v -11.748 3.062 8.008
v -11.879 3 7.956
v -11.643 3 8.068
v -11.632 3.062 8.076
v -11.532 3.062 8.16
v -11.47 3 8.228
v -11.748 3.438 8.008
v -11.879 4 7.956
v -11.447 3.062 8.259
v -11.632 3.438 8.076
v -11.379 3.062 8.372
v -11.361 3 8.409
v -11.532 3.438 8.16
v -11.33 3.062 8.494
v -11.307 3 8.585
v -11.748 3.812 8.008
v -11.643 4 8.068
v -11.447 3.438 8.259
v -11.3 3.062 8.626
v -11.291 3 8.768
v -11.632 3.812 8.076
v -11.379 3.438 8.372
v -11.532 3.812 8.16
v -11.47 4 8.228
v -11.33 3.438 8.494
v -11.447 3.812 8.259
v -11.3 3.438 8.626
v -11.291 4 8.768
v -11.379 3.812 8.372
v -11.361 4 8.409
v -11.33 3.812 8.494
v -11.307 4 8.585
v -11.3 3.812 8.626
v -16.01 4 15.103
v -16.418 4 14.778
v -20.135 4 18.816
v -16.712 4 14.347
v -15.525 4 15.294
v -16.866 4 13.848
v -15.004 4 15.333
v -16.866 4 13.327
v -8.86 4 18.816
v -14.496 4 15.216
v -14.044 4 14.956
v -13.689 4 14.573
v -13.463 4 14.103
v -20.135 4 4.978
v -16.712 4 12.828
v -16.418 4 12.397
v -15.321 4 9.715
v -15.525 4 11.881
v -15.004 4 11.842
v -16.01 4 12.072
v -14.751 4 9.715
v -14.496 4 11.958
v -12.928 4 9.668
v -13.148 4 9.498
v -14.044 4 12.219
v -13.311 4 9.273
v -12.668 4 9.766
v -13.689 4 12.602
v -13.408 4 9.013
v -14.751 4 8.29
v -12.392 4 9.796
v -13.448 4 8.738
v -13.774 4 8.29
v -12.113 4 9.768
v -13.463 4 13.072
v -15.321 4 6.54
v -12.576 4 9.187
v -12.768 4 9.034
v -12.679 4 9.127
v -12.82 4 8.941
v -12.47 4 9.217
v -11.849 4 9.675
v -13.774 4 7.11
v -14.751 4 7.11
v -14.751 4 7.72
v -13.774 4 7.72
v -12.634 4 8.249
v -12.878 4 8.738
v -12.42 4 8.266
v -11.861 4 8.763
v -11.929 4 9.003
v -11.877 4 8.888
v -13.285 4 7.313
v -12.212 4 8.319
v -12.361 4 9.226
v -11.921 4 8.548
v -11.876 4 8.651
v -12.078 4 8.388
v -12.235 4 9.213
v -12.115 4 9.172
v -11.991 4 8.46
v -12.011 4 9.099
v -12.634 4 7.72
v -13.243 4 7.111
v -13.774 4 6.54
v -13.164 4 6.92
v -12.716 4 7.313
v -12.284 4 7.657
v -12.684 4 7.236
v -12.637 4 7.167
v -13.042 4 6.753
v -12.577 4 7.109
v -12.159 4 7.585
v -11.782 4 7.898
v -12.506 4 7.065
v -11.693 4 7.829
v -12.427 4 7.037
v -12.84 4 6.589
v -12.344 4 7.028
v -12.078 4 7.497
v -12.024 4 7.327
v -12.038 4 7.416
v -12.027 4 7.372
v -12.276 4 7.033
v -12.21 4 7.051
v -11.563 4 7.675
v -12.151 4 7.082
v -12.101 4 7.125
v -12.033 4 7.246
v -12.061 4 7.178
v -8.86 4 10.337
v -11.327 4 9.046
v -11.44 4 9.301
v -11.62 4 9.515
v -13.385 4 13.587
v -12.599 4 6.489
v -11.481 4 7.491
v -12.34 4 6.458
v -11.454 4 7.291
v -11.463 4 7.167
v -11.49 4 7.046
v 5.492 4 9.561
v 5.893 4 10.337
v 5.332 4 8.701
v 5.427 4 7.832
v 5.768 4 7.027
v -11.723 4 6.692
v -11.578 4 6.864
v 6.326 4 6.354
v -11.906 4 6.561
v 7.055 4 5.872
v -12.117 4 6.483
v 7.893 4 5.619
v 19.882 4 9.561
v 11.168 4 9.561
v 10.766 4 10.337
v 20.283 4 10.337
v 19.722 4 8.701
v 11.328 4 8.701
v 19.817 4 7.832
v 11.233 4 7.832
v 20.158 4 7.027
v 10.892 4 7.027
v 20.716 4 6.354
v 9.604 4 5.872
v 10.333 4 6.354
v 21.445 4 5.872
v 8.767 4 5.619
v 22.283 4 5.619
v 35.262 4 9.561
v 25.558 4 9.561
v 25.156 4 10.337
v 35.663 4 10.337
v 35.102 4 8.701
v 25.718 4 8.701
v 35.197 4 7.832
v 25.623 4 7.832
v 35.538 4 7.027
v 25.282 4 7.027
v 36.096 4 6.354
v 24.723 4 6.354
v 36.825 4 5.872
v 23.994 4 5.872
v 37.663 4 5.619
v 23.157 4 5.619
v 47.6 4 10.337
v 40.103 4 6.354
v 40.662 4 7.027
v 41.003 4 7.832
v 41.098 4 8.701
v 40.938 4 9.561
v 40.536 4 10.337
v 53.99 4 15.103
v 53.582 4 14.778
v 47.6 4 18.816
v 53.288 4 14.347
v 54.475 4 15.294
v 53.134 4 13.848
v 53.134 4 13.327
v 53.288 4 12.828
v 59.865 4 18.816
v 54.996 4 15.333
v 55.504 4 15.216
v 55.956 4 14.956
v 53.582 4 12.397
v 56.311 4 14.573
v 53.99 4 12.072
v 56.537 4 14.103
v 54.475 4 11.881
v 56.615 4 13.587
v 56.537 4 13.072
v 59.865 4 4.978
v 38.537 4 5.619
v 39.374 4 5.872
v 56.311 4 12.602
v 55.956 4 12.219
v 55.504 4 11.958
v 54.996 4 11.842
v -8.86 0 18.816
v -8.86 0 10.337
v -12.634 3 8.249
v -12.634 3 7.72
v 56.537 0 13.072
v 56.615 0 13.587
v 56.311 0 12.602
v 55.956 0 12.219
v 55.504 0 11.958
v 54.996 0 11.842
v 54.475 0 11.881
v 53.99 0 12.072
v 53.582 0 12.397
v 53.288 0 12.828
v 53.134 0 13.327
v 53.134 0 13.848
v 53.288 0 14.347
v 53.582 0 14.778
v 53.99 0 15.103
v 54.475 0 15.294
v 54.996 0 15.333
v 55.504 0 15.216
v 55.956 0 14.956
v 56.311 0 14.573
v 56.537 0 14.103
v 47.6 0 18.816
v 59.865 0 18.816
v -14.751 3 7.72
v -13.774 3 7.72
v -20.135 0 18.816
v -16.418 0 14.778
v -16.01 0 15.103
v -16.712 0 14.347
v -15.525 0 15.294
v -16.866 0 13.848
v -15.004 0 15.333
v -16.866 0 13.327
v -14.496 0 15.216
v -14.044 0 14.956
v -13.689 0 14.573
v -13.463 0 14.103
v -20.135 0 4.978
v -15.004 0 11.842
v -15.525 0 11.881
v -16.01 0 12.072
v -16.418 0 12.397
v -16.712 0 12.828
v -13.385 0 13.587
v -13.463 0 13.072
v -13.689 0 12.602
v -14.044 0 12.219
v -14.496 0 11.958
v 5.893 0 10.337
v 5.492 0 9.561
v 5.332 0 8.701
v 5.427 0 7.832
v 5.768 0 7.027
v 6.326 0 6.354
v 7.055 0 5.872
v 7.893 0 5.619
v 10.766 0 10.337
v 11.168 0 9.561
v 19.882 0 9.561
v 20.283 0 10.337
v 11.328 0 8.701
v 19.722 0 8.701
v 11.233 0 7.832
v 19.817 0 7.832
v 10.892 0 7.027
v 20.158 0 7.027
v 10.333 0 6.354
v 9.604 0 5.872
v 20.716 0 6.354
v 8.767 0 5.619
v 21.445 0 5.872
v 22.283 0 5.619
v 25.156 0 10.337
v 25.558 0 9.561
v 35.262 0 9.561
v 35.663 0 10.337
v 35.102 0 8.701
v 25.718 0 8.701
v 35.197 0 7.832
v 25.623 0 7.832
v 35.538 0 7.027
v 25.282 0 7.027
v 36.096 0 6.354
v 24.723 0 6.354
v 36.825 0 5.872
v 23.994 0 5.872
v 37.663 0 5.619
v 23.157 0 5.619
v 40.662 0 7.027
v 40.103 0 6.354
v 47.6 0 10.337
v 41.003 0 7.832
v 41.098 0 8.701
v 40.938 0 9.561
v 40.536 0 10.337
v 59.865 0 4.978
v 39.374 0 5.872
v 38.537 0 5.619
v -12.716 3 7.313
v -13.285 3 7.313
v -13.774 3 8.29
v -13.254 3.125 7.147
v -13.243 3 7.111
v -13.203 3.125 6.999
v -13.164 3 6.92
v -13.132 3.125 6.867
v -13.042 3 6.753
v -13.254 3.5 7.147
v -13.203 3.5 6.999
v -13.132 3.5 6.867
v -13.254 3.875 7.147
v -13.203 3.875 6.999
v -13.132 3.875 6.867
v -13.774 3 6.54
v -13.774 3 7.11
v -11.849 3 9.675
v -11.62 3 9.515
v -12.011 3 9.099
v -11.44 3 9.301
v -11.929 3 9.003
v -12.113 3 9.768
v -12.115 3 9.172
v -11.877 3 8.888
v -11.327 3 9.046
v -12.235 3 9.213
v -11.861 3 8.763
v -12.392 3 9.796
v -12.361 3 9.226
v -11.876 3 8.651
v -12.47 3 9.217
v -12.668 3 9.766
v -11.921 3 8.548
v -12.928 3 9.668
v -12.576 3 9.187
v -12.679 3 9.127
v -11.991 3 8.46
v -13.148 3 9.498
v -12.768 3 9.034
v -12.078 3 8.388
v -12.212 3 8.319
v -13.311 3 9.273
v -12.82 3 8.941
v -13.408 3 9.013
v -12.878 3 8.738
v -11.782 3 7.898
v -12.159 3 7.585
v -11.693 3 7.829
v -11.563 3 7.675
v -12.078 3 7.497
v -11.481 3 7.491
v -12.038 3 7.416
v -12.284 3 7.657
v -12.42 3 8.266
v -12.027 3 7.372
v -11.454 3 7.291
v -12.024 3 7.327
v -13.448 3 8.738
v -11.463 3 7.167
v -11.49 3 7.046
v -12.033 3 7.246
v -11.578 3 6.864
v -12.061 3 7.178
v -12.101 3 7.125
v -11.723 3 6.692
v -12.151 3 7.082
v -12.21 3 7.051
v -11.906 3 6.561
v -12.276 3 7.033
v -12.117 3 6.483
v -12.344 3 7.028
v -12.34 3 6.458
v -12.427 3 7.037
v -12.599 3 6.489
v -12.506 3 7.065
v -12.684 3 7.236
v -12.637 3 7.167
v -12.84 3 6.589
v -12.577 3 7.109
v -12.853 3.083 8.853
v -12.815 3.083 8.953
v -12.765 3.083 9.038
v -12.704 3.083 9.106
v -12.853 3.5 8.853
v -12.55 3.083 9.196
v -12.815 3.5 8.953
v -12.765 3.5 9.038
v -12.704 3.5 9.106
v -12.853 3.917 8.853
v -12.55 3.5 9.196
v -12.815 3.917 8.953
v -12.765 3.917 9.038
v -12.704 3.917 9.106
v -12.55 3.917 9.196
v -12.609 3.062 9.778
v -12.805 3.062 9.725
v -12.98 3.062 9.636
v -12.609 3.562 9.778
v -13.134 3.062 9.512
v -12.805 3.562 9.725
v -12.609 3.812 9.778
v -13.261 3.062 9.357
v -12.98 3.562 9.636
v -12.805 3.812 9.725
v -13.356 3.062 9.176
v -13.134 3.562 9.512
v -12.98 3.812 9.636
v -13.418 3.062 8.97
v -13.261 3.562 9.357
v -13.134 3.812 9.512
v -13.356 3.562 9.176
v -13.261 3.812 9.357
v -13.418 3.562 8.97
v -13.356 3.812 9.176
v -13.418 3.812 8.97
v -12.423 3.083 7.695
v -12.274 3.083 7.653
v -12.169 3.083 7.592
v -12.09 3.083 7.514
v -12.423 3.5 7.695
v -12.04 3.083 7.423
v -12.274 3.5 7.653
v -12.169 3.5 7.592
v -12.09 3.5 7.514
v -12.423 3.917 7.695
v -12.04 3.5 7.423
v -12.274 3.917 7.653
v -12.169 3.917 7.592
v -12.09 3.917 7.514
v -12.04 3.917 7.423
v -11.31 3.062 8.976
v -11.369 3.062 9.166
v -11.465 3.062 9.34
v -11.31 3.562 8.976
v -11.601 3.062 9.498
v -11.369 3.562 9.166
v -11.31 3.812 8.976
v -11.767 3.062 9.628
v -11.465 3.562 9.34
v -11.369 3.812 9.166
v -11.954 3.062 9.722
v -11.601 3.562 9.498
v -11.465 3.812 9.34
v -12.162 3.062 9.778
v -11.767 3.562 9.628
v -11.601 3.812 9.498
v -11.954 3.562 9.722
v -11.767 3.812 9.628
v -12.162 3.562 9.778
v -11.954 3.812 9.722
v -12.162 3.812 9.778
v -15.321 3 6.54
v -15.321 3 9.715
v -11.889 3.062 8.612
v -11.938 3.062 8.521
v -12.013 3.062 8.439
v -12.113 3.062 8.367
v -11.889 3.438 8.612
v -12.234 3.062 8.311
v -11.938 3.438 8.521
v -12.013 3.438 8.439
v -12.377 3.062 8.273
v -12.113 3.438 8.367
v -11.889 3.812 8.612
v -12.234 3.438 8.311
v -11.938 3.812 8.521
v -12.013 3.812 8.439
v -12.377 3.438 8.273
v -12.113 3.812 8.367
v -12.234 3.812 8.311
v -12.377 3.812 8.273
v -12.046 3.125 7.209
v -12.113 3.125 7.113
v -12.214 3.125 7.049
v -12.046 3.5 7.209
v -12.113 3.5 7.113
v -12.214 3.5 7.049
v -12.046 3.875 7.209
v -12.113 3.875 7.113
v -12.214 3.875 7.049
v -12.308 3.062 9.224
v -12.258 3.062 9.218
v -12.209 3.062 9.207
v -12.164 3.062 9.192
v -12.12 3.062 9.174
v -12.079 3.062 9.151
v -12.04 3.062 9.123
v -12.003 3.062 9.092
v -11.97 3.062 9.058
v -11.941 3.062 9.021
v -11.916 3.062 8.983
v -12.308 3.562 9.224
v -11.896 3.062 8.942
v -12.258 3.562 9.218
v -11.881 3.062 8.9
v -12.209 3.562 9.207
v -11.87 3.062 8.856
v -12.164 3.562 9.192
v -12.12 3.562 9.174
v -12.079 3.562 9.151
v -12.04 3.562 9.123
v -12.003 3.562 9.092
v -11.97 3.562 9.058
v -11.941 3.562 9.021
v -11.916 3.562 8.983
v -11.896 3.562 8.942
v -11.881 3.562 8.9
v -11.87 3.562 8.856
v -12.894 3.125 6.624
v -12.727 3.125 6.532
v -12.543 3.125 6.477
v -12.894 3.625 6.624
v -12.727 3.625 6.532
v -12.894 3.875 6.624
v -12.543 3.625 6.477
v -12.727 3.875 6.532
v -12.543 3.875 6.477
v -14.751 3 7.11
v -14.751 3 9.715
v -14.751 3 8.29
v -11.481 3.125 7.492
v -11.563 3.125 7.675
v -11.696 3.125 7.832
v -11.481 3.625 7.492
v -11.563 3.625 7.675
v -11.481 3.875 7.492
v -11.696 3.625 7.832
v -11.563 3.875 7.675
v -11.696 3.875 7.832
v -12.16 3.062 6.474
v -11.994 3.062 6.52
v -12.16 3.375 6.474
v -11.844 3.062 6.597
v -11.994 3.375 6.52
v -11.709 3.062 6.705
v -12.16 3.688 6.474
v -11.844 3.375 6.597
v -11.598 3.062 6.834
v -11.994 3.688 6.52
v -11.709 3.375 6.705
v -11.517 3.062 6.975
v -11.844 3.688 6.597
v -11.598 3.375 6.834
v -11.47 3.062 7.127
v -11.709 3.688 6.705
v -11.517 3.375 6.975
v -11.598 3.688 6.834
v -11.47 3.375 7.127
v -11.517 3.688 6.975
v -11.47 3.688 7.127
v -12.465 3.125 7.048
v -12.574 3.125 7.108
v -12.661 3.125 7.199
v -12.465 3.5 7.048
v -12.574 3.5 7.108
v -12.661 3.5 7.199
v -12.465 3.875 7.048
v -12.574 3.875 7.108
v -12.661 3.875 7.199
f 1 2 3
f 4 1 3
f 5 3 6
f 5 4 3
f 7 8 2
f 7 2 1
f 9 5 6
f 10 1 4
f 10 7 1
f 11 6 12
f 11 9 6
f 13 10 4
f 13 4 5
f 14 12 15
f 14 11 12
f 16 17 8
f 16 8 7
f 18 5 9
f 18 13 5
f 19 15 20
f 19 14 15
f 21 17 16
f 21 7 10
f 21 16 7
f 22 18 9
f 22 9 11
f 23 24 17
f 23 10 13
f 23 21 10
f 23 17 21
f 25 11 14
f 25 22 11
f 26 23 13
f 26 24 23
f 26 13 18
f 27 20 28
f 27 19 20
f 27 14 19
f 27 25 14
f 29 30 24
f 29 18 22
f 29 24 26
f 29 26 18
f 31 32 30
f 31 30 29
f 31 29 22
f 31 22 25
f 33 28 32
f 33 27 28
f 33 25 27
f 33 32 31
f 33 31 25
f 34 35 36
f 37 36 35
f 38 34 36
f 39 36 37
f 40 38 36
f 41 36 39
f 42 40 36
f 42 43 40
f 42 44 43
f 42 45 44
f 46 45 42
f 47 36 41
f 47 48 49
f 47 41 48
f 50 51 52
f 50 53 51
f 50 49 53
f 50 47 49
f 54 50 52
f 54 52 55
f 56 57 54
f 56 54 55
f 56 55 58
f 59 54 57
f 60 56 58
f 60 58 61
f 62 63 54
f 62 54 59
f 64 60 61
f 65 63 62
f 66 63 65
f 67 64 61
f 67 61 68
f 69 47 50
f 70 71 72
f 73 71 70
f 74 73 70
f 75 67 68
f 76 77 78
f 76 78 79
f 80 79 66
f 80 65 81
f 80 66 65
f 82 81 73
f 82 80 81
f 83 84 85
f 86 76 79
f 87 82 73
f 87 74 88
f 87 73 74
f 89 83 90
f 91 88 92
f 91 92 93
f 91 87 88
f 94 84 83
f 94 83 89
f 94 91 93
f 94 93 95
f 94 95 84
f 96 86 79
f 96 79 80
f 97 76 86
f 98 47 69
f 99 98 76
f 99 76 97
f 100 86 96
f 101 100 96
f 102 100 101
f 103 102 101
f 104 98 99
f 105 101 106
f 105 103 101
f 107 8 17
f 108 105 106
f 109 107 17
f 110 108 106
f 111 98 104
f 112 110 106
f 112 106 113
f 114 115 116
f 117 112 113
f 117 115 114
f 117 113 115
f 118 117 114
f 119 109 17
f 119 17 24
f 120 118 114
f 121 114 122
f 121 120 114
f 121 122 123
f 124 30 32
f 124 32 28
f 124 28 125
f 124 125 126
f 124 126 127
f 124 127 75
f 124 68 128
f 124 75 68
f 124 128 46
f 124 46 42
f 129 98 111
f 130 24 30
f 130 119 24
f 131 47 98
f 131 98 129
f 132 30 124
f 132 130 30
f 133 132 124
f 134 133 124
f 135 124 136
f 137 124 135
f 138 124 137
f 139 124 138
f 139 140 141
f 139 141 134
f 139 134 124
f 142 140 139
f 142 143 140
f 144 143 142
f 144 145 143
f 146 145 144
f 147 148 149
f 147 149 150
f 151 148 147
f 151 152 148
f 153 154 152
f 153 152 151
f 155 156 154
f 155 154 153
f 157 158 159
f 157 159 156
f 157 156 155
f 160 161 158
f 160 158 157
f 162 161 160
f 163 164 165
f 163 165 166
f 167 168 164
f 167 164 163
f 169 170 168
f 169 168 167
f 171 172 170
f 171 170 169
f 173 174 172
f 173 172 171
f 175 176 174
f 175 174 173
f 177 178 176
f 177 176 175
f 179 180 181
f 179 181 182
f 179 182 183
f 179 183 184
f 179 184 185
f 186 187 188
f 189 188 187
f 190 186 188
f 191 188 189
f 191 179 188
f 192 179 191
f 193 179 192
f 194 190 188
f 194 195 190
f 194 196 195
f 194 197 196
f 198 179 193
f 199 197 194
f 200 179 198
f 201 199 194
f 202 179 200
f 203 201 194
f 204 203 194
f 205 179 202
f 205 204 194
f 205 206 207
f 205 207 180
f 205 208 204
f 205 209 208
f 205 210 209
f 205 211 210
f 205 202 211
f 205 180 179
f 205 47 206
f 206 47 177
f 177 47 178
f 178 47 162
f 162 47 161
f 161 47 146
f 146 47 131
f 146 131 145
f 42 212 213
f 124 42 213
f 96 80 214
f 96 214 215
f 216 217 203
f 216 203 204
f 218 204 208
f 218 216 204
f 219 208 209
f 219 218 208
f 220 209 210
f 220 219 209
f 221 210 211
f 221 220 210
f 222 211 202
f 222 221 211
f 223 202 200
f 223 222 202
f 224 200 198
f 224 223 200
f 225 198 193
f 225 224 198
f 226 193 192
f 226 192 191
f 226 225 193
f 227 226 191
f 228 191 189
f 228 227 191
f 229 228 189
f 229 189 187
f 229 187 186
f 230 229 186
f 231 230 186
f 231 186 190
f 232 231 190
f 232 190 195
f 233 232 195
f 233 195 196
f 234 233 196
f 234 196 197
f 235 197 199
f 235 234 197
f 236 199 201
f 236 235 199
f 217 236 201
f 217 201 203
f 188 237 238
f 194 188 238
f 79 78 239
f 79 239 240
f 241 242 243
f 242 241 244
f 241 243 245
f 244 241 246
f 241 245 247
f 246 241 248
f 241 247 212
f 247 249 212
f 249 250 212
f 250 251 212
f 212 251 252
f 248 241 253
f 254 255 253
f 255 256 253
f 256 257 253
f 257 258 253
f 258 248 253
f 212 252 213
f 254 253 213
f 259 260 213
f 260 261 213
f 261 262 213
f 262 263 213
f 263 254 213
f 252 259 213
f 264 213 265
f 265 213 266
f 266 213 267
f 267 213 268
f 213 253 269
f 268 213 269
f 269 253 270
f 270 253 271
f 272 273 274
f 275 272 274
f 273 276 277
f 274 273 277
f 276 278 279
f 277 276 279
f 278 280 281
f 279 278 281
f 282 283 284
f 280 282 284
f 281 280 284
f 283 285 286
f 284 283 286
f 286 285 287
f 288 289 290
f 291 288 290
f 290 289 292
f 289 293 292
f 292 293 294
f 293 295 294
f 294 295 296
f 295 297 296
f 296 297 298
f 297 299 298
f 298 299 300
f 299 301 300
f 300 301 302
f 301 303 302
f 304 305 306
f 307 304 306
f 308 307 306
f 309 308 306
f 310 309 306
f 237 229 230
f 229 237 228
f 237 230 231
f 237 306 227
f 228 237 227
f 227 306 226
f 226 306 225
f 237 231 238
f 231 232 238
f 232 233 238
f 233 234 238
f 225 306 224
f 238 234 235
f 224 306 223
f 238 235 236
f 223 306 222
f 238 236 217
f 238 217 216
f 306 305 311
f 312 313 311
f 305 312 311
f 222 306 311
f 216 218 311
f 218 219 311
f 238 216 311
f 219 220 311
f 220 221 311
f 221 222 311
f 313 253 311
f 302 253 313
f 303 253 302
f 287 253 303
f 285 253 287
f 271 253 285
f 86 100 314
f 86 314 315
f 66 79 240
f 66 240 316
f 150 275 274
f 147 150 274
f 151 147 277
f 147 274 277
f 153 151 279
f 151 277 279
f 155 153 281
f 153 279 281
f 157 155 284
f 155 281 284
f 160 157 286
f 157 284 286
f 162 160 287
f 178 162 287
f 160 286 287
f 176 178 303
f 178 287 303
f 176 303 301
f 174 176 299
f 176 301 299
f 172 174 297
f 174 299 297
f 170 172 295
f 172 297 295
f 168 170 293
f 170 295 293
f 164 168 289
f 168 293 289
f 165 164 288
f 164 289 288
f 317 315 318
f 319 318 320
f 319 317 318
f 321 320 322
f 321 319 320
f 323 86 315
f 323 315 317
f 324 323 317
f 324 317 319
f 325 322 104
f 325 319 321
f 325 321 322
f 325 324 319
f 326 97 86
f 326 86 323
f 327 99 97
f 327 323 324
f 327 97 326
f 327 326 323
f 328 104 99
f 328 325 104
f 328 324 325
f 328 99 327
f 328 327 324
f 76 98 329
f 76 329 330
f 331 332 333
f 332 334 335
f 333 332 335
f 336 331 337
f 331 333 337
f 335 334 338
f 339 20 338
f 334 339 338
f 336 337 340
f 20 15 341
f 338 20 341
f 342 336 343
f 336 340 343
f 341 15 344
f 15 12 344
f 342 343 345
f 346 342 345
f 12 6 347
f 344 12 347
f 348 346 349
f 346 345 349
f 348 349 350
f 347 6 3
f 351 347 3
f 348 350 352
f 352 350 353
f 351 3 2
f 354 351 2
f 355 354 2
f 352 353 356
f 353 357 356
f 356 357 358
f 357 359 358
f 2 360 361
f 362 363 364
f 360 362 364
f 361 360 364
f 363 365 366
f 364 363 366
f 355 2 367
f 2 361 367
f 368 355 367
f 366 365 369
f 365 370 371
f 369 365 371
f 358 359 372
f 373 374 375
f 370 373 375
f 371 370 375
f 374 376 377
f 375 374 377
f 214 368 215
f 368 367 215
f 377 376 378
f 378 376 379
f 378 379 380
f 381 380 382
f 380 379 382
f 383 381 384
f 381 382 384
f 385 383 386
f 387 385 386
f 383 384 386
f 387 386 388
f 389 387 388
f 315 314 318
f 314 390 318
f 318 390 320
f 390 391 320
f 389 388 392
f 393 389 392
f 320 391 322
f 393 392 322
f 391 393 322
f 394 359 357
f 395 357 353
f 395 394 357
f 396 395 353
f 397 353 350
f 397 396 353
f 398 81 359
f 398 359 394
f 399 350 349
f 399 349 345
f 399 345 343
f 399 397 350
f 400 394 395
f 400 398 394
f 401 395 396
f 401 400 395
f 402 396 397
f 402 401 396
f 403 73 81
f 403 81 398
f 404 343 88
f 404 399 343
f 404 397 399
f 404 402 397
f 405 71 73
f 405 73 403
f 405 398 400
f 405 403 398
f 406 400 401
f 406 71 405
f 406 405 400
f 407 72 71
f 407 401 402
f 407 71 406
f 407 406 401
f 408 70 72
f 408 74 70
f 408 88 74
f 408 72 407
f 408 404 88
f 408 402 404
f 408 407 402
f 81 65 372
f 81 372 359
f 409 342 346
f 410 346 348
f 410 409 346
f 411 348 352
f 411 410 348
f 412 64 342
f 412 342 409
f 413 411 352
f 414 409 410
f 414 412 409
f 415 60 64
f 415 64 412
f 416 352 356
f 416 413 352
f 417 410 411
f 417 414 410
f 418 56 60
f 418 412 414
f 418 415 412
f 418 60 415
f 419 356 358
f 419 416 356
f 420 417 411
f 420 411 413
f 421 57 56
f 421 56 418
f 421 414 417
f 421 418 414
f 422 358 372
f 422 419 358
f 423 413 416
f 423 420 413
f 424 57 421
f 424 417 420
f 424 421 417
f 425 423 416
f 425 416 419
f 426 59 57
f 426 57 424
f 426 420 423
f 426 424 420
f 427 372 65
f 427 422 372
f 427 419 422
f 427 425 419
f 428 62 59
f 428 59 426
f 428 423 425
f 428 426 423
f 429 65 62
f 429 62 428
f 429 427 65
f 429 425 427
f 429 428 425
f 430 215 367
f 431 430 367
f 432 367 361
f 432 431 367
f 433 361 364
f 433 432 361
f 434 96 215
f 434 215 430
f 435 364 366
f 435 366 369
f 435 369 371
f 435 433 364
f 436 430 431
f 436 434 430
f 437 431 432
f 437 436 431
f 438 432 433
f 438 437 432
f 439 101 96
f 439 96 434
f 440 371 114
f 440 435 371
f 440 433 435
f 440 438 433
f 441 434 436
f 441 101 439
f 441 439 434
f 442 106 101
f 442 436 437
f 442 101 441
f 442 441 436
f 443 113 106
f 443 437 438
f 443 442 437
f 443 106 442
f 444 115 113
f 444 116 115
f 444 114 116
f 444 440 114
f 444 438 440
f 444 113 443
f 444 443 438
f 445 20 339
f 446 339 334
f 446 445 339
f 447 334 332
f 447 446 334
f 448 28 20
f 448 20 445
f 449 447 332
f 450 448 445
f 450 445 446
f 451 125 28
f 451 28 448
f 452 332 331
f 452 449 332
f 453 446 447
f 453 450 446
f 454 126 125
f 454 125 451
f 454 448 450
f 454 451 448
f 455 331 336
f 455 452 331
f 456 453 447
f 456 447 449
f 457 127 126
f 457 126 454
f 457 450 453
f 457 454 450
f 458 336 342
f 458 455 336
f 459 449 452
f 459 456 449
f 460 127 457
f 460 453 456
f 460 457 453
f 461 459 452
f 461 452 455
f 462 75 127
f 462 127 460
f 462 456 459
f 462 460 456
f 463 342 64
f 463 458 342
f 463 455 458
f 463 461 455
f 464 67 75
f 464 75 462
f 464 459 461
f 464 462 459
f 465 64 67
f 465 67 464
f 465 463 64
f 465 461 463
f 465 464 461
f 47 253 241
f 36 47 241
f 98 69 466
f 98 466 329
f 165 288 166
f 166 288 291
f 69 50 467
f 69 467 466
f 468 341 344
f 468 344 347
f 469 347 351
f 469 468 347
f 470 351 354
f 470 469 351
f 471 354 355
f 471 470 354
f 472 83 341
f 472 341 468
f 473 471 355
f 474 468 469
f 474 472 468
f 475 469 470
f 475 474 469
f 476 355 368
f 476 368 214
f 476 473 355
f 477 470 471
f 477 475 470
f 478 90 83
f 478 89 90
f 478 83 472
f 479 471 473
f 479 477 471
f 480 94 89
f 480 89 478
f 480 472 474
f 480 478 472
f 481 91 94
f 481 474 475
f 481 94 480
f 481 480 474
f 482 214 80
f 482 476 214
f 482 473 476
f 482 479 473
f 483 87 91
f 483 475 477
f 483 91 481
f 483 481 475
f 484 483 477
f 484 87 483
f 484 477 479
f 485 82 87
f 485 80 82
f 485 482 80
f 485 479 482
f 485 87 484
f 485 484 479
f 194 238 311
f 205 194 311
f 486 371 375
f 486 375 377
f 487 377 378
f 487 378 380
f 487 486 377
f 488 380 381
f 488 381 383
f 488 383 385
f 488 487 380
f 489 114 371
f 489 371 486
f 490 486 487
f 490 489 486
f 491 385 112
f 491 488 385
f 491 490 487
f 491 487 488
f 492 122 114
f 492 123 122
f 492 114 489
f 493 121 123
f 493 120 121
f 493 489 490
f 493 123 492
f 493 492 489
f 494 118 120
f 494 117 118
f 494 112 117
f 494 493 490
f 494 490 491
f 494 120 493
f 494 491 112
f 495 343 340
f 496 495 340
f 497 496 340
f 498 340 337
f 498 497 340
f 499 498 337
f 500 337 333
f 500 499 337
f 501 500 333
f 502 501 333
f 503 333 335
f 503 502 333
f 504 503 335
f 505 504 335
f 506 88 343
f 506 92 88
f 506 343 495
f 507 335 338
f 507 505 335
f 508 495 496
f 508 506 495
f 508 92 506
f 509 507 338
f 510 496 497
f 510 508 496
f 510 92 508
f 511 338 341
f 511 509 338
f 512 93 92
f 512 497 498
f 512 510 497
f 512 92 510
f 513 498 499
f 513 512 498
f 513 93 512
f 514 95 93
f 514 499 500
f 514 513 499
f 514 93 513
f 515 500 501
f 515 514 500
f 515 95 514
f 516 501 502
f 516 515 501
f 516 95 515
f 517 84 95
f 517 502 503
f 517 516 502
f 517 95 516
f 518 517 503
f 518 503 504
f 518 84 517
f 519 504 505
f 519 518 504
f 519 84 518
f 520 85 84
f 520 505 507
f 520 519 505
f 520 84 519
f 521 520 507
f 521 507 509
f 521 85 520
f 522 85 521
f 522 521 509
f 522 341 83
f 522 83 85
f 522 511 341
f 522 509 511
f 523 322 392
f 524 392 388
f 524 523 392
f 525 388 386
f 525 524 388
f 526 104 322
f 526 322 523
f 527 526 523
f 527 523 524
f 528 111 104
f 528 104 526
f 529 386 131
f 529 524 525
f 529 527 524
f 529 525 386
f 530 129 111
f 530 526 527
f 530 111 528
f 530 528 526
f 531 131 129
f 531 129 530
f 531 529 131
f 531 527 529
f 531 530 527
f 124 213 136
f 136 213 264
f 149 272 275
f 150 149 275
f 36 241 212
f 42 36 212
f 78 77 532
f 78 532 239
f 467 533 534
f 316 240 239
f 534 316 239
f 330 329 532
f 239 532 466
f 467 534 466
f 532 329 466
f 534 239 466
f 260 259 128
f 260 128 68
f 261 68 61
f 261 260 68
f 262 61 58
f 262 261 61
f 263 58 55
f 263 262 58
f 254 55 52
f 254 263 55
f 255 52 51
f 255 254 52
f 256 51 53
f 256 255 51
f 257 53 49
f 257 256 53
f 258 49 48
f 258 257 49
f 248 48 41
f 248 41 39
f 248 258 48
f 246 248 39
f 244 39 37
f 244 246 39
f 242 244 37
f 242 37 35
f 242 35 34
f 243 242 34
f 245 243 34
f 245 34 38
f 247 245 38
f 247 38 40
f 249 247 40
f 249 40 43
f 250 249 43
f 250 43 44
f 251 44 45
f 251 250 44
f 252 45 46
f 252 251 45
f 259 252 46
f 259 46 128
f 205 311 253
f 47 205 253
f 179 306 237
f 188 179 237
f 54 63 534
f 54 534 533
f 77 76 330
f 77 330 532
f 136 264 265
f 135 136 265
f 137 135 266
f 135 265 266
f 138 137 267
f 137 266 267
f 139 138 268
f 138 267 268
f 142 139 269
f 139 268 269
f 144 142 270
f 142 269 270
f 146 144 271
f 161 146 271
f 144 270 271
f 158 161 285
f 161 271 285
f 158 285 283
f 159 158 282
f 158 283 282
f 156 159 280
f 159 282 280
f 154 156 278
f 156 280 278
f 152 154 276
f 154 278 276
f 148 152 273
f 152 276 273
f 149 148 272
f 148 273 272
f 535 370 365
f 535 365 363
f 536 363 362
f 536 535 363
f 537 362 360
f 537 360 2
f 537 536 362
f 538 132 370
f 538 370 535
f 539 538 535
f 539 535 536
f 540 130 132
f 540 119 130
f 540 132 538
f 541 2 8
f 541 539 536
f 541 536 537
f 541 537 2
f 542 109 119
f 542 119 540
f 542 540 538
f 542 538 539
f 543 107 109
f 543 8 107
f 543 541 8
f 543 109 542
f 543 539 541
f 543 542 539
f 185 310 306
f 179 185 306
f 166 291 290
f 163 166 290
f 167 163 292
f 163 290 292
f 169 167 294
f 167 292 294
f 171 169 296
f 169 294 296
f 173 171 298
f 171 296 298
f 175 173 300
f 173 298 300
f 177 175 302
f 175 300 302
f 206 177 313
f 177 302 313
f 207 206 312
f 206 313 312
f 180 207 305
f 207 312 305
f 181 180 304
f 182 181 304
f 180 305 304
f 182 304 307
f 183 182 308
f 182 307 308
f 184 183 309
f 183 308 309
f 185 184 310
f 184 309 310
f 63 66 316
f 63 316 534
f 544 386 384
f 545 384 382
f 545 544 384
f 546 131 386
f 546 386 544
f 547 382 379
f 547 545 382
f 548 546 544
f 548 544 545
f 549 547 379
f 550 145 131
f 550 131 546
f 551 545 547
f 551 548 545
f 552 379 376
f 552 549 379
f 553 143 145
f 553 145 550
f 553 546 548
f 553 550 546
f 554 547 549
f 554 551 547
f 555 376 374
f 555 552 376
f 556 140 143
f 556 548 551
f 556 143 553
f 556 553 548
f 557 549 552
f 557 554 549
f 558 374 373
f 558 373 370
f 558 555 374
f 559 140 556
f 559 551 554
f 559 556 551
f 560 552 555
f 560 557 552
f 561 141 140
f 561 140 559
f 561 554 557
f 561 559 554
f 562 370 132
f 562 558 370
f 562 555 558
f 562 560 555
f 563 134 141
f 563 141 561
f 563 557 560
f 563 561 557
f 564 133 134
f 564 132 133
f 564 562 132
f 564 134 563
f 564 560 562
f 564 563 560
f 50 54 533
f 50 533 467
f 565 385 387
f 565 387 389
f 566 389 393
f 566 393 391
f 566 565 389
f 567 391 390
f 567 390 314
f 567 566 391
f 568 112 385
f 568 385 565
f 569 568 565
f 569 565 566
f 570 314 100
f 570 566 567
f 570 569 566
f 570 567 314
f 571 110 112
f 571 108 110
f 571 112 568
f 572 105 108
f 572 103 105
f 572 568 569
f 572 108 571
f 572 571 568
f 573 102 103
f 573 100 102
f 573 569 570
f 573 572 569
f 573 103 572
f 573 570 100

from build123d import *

# Parameters (mm, degrees)
SKETCH1_R           = 1.75
BOSS_EXTRUDE1_DEPTH = 4
CUT_EXTRUDE1_DEPTH  = 1


with BuildPart() as part:
    # Sketch1 → Boss-Extrude1 (new body)
    with BuildSketch(Plane(origin=(0, 0, 0), x_dir=(1, 0, 0), z_dir=(0, 1, 0))):
        with BuildLine():
            Line((-20.135223818, -18.81631321), (-8.860223818, -18.81631321))
            Line((-8.860223818, -18.81631321), (-8.860223818, -10.337442774))
            Line((-8.860223818, -10.337442774), (5.893076938, -10.33744141))
            ThreePointArc((5.893076938, -10.33744141), (8.329775763, -5.587442326), (10.766475916, -10.337440728))
            Line((10.766475916, -10.337440728), (20.283076449, -10.337440728))
            ThreePointArc((20.283076449, -10.337440728), (22.719776182, -5.587442326), (25.156475916, -10.337440728))
            Line((25.156475916, -10.337440728), (35.663076449, -10.337440728))
            ThreePointArc((35.663076449, -10.337440728), (38.099775199, -5.587442326), (40.536477064, -10.33743913))
            Line((40.536477064, -10.33743913), (47.599776182, -10.33743913))
            Line((47.599776182, -10.33743913), (47.599776182, -18.81631321))
            Line((47.599776182, -18.81631321), (59.864776182, -18.81631321))
            Line((59.864776182, -18.81631321), (59.864776182, -4.977918302))
            Line((59.864776182, -4.977918302), (-20.135223818, -4.977918302))
            Line((-20.135223818, -4.977918302), (-20.135223818, -18.81631321))
        make_face()
        with Locations((-15.135223818, -13.587440845)):
            Circle(SKETCH1_R, mode=Mode.SUBTRACT)
        with Locations((54.864776182, -13.587440845)):
            Circle(SKETCH1_R, mode=Mode.SUBTRACT)
    extrude(amount=BOSS_EXTRUDE1_DEPTH)

    # Sketch2 → Cut-Extrude1 (cut)
    with BuildSketch(Plane(origin=(0, 4, 0), x_dir=(1, 0, 0), z_dir=(0, 1, 0))):
        Polygon((-15.320752279, -6.539659084), (-13.773957408, -6.539659084), (-13.773957408, -7.109530878), (-14.750880484, -7.109530878), (-14.750880484, -7.720107802), (-13.773957408, -7.720107802), (-13.773957408, -8.289979596), (-14.750880484, -8.289979596), (-14.750880484, -9.714659084), (-15.320752279, -9.714659084), align=None)
        with BuildLine():
            Line((-12.715624074, -7.31305652), (-13.285495869, -7.31305652))
            add(Edge.make_bspline(
                [(-13.285495869, -7.31305652), (-13.281472358, -7.284570661), (-13.27358453, -7.228726024), (-13.254710012, -7.1478769), (-13.232134053, -7.071185973), (-13.20394912, -6.998896107), (-13.17089278, -6.93087853), (-13.133301178, -6.86689984), (-13.090767935, -6.807234643), (-13.058165754, -6.771292092), (-13.041901118, -6.753361007)],
                knots=[0, 0, 0, 0, 1.111473889, 2.178970933, 3.205615836, 4.199322666, 5.174200091, 6.12565194, 7.064921805, 8, 8, 8, 8], degree=3))
            add(Edge.make_bspline(
                [(-13.041901118, -6.753361007), (-13.018441535, -6.729702238), (-12.972205164, -6.683073292), (-12.894938765, -6.623346763), (-12.813949309, -6.571657514), (-12.727612518, -6.530677903), (-12.637271857, -6.497509656), (-12.542208906, -6.475230469), (-12.442812126, -6.460448032), (-12.374986328, -6.458991911), (-12.340373674, -6.458248827)],
                knots=[0, 0, 0, 0, 1.01925491, 2.00884431, 2.983262333, 3.955970413, 4.92937149, 5.924503185, 6.940838805, 8, 8, 8, 8], degree=3))
            add(Edge.make_bspline(
                [(-12.340373674, -6.458248827), (-12.309601243, -6.458975304), (-12.249108846, -6.460403411), (-12.160200243, -6.471867479), (-12.07543333, -6.491974177), (-11.993912097, -6.518263234), (-11.916835455, -6.554033889), (-11.842502249, -6.595556006), (-11.772989349, -6.646484608), (-11.70813411, -6.704028804), (-11.648552204, -6.766268484), (-11.596954011, -6.832797584), (-11.55259412, -6.901838958), (-11.516047437, -6.973966208), (-11.487948004, -7.049301384), (-11.468446164, -7.127409284), (-11.455681736, -7.208117556), (-11.454410065, -7.262973882), (-11.4537651, -7.290795903)],
                knots=[0, 0, 0, 0, 1.091422571, 2.145516843, 3.172569842, 4.178562979, 5.178154469, 6.181868002, 7.194278174, 8.227918432, 9.254613415, 10.245994977, 11.209837596, 12.161663635, 13.10878368, 14.055455738, 15.013766427, 16, 16, 16, 16], degree=3))
            add(Edge.make_bspline(
                [(-11.4537651, -7.290795903), (-11.455088608, -7.325251158), (-11.457694188, -7.393082963), (-11.479074861, -7.492359849), (-11.512541427, -7.58728627), (-11.560887138, -7.67653406), (-11.62133159, -7.759860338), (-11.695494907, -7.834479257), (-11.781264727, -7.901560739), (-11.845653274, -7.937610336), (-11.878624876, -7.956070342)],
                knots=[0, 0, 0, 0, 0.992805628, 1.954529043, 2.915727527, 3.886831945, 4.871318353, 5.87440735, 6.911542536, 8, 8, 8, 8], degree=3))
            add(Edge.make_bspline(
                [(-11.878624876, -7.956070342), (-11.855993674, -7.963500642), (-11.811524378, -7.978100848), (-11.748316621, -8.006855789), (-11.688213266, -8.038280173), (-11.632249272, -8.074787023), (-11.57986801, -8.114900165), (-11.531388801, -8.1589625), (-11.486521994, -8.206877951), (-11.446000021, -8.258910035), (-11.410035187, -8.314226601), (-11.377765856, -8.371549868), (-11.351206398, -8.431749155), (-11.328707231, -8.494136944), (-11.311577646, -8.559273944), (-11.299516887, -8.626907755), (-11.292545473, -8.6968841), (-11.291482213, -8.744293031), (-11.290944587, -8.768264853)],
                knots=[0, 0, 0, 0, 1.059543567, 2.081955587, 3.086750234, 4.076226789, 5.052108497, 6.020845489, 6.989030705, 7.970690546, 8.952259656, 9.923888338, 10.895517021, 11.877585046, 12.873342345, 13.889638361, 14.932918083, 16, 16, 16, 16], degree=3))
            add(Edge.make_bspline(
                [(-11.290944587, -8.768264853), (-11.292034427, -8.803493698), (-11.294183369, -8.872957806), (-11.30784534, -8.975271328), (-11.333281467, -9.072818182), (-11.366744101, -9.16672079), (-11.411379623, -9.255766904), (-11.463908129, -9.342000012), (-11.528476217, -9.422429573), (-11.600232559, -9.499181935), (-11.679922161, -9.568961747), (-11.766318654, -9.629457703), (-11.857522252, -9.681373997), (-11.954109976, -9.723521124), (-12.056048269, -9.755979232), (-12.163109918, -9.779441448), (-12.275744768, -9.793796021), (-12.352626866, -9.795300826), (-12.391891101, -9.79606934)],
                knots=[0, 0, 0, 0, 1.005138573, 1.981928558, 2.936866704, 3.876260664, 4.820238198, 5.773547, 6.751179199, 7.756627054, 8.768222608, 9.766606018, 10.760583154, 11.757261445, 12.767156078, 13.807575856, 14.880313354, 16, 16, 16, 16], degree=3))
            add(Edge.make_bspline(
                [(-12.391891101, -9.79606934), (-12.429034435, -9.795259071), (-12.501663309, -9.793674698), (-12.607898237, -9.779961147), (-12.708864481, -9.757840075), (-12.804819707, -9.726658589), (-12.895392673, -9.686221532), (-12.98140473, -9.638070069), (-13.061139525, -9.579426938), (-13.135485462, -9.512939399), (-13.202793323, -9.438344155), (-13.2629507, -9.357369168), (-13.314631113, -9.269706524), (-13.358046503, -9.175730754), (-13.39285746, -9.075276996), (-13.420316241, -8.968549527), (-13.439496649, -8.855339836), (-13.445338083, -8.77744916), (-13.448316382, -8.737736007)],
                knots=[0, 0, 0, 0, 1.066544725, 2.085487077, 3.070979577, 4.031932826, 4.977951092, 5.916076795, 6.857635327, 7.814973522, 8.776389752, 9.738577119, 10.707772778, 11.69409279, 12.707140348, 13.757286496, 14.856535458, 16, 16, 16, 16], degree=3))
            Line((-13.448316382, -8.737736007), (-12.878444587, -8.737736007))
            add(Edge.make_bspline(
                [(-12.878444587, -8.737736007), (-12.874833369, -8.757704302), (-12.867799575, -8.796597793), (-12.85408059, -8.852906922), (-12.836202839, -8.904883726), (-12.815531711, -8.952990173), (-12.793203781, -8.997857884), (-12.766226302, -9.037829784), (-12.736576042, -9.073991275), (-12.693790501, -9.116980452), (-12.632625623, -9.161150038), (-12.550032773, -9.199535509), (-12.45815605, -9.222034111), (-12.393925058, -9.224778872), (-12.360726238, -9.226197545)],
                knots=[0, 0, 0, 0, 0.928156231, 1.807827665, 2.648129825, 3.438902246, 4.202261636, 4.936546065, 5.639352463, 6.338805438, 7.70633318, 9.064371875, 10.482673459, 12, 12, 12, 12], degree=3))
            add(Edge.make_bspline(
                [(-12.360726238, -9.226197545), (-12.34310977, -9.225895452), (-12.308603052, -9.225303719), (-12.257917821, -9.218745152), (-12.209633001, -9.207943188), (-12.163658661, -9.193263718), (-12.119702124, -9.174862085), (-12.078603224, -9.15113428), (-12.039524263, -9.12354732), (-12.002890065, -9.092532254), (-11.969039311, -9.058736934), (-11.940873493, -9.021314358), (-11.915131973, -8.983286333), (-11.896093359, -8.94216493), (-11.879411432, -8.900162922), (-11.869201241, -8.855755765), (-11.861491813, -8.809875003), (-11.861043772, -8.778476224), (-11.860816382, -8.762540694)],
                knots=[0, 0, 0, 0, 1.110435564, 2.175094844, 3.216326037, 4.226890168, 5.215276772, 6.21526065, 7.213097102, 8.228249917, 9.239874822, 10.221364777, 11.178138315, 12.128914389, 13.072518965, 14.022636769, 14.996447288, 16, 16, 16, 16], degree=3))
            add(Edge.make_bspline(
                [(-11.860816382, -8.762540694), (-11.86142006, -8.745112478), (-11.862621845, -8.710416892), (-11.872440552, -8.65978598), (-11.887946365, -8.611083124), (-11.909485835, -8.564524002), (-11.938249395, -8.520280222), (-11.972190076, -8.47746412), (-12.013981841, -8.438304198), (-12.059833004, -8.399595801), (-12.113002341, -8.365853754), (-12.170900429, -8.334714802), (-12.235048922, -8.30993781), (-12.303881896, -8.287807366), (-12.378701392, -8.271643634), (-12.459042809, -8.259907189), (-12.544776544, -8.251171225), (-12.603873921, -8.249917907), (-12.634213818, -8.249274468)],
                knots=[0, 0, 0, 0, 0.809814727, 1.612155564, 2.388397, 3.182215007, 3.988903953, 4.837162975, 5.715530372, 6.646997145, 7.623086902, 8.637258368, 9.698941581, 10.815059213, 11.996518529, 13.252603015, 14.589518788, 16, 16, 16, 16], degree=3))
            Line((-12.634213818, -8.249274468), (-12.634213818, -7.720107802))
            add(Edge.make_bspline(
                [(-12.634213818, -7.720107802), (-12.596438842, -7.716890764), (-12.525769343, -7.710872323), (-12.42767629, -7.69679799), (-12.345094583, -7.677985328), (-12.276039371, -7.655288868), (-12.218700348, -7.626140701), (-12.168609294, -7.593962412), (-12.125468509, -7.556592032), (-12.089008758, -7.51514394), (-12.059842092, -7.470632577), (-12.039199625, -7.423749779), (-12.025568418, -7.37594616), (-12.024276862, -7.343249925), (-12.023636895, -7.327048907)],
                knots=[0, 0, 0, 0, 1.70044513, 3.18119609, 4.440695891, 5.496282586, 6.431922213, 7.318171381, 8.16090191, 8.983045123, 9.787564368, 10.536848927, 11.275007137, 12, 12, 12, 12], degree=3))
            add(Edge.make_bspline(
                [(-12.023636895, -7.327048907), (-12.024741021, -7.306378167), (-12.026896043, -7.26603326), (-12.043633107, -7.208291197), (-12.072686755, -7.156818934), (-12.111642594, -7.111724783), (-12.159111639, -7.074058769), (-12.214753681, -7.046713885), (-12.277361285, -7.030647544), (-12.321409108, -7.028982006), (-12.344189779, -7.028120622)],
                knots=[0, 0, 0, 0, 1.009664648, 1.970651636, 2.907870547, 3.878035693, 4.867062054, 5.849714035, 6.887914197, 8, 8, 8, 8], degree=3))
            add(Edge.make_bspline(
                [(-12.344189779, -7.028120622), (-12.364837897, -7.029136964), (-12.405810086, -7.031153699), (-12.46572369, -7.046206069), (-12.522621653, -7.071544861), (-12.575325778, -7.106485562), (-12.623075271, -7.148447862), (-12.662263828, -7.198143497), (-12.694859012, -7.252595115), (-12.708675252, -7.29282371), (-12.715624074, -7.31305652)],
                knots=[0, 0, 0, 0, 0.98818071, 1.960853194, 2.938124878, 3.957524365, 4.978590984, 5.968022688, 6.978025184, 8, 8, 8, 8], degree=3))
        make_face()
    extrude(amount=-CUT_EXTRUDE1_DEPTH, mode=Mode.SUBTRACT)


solid = part.part
